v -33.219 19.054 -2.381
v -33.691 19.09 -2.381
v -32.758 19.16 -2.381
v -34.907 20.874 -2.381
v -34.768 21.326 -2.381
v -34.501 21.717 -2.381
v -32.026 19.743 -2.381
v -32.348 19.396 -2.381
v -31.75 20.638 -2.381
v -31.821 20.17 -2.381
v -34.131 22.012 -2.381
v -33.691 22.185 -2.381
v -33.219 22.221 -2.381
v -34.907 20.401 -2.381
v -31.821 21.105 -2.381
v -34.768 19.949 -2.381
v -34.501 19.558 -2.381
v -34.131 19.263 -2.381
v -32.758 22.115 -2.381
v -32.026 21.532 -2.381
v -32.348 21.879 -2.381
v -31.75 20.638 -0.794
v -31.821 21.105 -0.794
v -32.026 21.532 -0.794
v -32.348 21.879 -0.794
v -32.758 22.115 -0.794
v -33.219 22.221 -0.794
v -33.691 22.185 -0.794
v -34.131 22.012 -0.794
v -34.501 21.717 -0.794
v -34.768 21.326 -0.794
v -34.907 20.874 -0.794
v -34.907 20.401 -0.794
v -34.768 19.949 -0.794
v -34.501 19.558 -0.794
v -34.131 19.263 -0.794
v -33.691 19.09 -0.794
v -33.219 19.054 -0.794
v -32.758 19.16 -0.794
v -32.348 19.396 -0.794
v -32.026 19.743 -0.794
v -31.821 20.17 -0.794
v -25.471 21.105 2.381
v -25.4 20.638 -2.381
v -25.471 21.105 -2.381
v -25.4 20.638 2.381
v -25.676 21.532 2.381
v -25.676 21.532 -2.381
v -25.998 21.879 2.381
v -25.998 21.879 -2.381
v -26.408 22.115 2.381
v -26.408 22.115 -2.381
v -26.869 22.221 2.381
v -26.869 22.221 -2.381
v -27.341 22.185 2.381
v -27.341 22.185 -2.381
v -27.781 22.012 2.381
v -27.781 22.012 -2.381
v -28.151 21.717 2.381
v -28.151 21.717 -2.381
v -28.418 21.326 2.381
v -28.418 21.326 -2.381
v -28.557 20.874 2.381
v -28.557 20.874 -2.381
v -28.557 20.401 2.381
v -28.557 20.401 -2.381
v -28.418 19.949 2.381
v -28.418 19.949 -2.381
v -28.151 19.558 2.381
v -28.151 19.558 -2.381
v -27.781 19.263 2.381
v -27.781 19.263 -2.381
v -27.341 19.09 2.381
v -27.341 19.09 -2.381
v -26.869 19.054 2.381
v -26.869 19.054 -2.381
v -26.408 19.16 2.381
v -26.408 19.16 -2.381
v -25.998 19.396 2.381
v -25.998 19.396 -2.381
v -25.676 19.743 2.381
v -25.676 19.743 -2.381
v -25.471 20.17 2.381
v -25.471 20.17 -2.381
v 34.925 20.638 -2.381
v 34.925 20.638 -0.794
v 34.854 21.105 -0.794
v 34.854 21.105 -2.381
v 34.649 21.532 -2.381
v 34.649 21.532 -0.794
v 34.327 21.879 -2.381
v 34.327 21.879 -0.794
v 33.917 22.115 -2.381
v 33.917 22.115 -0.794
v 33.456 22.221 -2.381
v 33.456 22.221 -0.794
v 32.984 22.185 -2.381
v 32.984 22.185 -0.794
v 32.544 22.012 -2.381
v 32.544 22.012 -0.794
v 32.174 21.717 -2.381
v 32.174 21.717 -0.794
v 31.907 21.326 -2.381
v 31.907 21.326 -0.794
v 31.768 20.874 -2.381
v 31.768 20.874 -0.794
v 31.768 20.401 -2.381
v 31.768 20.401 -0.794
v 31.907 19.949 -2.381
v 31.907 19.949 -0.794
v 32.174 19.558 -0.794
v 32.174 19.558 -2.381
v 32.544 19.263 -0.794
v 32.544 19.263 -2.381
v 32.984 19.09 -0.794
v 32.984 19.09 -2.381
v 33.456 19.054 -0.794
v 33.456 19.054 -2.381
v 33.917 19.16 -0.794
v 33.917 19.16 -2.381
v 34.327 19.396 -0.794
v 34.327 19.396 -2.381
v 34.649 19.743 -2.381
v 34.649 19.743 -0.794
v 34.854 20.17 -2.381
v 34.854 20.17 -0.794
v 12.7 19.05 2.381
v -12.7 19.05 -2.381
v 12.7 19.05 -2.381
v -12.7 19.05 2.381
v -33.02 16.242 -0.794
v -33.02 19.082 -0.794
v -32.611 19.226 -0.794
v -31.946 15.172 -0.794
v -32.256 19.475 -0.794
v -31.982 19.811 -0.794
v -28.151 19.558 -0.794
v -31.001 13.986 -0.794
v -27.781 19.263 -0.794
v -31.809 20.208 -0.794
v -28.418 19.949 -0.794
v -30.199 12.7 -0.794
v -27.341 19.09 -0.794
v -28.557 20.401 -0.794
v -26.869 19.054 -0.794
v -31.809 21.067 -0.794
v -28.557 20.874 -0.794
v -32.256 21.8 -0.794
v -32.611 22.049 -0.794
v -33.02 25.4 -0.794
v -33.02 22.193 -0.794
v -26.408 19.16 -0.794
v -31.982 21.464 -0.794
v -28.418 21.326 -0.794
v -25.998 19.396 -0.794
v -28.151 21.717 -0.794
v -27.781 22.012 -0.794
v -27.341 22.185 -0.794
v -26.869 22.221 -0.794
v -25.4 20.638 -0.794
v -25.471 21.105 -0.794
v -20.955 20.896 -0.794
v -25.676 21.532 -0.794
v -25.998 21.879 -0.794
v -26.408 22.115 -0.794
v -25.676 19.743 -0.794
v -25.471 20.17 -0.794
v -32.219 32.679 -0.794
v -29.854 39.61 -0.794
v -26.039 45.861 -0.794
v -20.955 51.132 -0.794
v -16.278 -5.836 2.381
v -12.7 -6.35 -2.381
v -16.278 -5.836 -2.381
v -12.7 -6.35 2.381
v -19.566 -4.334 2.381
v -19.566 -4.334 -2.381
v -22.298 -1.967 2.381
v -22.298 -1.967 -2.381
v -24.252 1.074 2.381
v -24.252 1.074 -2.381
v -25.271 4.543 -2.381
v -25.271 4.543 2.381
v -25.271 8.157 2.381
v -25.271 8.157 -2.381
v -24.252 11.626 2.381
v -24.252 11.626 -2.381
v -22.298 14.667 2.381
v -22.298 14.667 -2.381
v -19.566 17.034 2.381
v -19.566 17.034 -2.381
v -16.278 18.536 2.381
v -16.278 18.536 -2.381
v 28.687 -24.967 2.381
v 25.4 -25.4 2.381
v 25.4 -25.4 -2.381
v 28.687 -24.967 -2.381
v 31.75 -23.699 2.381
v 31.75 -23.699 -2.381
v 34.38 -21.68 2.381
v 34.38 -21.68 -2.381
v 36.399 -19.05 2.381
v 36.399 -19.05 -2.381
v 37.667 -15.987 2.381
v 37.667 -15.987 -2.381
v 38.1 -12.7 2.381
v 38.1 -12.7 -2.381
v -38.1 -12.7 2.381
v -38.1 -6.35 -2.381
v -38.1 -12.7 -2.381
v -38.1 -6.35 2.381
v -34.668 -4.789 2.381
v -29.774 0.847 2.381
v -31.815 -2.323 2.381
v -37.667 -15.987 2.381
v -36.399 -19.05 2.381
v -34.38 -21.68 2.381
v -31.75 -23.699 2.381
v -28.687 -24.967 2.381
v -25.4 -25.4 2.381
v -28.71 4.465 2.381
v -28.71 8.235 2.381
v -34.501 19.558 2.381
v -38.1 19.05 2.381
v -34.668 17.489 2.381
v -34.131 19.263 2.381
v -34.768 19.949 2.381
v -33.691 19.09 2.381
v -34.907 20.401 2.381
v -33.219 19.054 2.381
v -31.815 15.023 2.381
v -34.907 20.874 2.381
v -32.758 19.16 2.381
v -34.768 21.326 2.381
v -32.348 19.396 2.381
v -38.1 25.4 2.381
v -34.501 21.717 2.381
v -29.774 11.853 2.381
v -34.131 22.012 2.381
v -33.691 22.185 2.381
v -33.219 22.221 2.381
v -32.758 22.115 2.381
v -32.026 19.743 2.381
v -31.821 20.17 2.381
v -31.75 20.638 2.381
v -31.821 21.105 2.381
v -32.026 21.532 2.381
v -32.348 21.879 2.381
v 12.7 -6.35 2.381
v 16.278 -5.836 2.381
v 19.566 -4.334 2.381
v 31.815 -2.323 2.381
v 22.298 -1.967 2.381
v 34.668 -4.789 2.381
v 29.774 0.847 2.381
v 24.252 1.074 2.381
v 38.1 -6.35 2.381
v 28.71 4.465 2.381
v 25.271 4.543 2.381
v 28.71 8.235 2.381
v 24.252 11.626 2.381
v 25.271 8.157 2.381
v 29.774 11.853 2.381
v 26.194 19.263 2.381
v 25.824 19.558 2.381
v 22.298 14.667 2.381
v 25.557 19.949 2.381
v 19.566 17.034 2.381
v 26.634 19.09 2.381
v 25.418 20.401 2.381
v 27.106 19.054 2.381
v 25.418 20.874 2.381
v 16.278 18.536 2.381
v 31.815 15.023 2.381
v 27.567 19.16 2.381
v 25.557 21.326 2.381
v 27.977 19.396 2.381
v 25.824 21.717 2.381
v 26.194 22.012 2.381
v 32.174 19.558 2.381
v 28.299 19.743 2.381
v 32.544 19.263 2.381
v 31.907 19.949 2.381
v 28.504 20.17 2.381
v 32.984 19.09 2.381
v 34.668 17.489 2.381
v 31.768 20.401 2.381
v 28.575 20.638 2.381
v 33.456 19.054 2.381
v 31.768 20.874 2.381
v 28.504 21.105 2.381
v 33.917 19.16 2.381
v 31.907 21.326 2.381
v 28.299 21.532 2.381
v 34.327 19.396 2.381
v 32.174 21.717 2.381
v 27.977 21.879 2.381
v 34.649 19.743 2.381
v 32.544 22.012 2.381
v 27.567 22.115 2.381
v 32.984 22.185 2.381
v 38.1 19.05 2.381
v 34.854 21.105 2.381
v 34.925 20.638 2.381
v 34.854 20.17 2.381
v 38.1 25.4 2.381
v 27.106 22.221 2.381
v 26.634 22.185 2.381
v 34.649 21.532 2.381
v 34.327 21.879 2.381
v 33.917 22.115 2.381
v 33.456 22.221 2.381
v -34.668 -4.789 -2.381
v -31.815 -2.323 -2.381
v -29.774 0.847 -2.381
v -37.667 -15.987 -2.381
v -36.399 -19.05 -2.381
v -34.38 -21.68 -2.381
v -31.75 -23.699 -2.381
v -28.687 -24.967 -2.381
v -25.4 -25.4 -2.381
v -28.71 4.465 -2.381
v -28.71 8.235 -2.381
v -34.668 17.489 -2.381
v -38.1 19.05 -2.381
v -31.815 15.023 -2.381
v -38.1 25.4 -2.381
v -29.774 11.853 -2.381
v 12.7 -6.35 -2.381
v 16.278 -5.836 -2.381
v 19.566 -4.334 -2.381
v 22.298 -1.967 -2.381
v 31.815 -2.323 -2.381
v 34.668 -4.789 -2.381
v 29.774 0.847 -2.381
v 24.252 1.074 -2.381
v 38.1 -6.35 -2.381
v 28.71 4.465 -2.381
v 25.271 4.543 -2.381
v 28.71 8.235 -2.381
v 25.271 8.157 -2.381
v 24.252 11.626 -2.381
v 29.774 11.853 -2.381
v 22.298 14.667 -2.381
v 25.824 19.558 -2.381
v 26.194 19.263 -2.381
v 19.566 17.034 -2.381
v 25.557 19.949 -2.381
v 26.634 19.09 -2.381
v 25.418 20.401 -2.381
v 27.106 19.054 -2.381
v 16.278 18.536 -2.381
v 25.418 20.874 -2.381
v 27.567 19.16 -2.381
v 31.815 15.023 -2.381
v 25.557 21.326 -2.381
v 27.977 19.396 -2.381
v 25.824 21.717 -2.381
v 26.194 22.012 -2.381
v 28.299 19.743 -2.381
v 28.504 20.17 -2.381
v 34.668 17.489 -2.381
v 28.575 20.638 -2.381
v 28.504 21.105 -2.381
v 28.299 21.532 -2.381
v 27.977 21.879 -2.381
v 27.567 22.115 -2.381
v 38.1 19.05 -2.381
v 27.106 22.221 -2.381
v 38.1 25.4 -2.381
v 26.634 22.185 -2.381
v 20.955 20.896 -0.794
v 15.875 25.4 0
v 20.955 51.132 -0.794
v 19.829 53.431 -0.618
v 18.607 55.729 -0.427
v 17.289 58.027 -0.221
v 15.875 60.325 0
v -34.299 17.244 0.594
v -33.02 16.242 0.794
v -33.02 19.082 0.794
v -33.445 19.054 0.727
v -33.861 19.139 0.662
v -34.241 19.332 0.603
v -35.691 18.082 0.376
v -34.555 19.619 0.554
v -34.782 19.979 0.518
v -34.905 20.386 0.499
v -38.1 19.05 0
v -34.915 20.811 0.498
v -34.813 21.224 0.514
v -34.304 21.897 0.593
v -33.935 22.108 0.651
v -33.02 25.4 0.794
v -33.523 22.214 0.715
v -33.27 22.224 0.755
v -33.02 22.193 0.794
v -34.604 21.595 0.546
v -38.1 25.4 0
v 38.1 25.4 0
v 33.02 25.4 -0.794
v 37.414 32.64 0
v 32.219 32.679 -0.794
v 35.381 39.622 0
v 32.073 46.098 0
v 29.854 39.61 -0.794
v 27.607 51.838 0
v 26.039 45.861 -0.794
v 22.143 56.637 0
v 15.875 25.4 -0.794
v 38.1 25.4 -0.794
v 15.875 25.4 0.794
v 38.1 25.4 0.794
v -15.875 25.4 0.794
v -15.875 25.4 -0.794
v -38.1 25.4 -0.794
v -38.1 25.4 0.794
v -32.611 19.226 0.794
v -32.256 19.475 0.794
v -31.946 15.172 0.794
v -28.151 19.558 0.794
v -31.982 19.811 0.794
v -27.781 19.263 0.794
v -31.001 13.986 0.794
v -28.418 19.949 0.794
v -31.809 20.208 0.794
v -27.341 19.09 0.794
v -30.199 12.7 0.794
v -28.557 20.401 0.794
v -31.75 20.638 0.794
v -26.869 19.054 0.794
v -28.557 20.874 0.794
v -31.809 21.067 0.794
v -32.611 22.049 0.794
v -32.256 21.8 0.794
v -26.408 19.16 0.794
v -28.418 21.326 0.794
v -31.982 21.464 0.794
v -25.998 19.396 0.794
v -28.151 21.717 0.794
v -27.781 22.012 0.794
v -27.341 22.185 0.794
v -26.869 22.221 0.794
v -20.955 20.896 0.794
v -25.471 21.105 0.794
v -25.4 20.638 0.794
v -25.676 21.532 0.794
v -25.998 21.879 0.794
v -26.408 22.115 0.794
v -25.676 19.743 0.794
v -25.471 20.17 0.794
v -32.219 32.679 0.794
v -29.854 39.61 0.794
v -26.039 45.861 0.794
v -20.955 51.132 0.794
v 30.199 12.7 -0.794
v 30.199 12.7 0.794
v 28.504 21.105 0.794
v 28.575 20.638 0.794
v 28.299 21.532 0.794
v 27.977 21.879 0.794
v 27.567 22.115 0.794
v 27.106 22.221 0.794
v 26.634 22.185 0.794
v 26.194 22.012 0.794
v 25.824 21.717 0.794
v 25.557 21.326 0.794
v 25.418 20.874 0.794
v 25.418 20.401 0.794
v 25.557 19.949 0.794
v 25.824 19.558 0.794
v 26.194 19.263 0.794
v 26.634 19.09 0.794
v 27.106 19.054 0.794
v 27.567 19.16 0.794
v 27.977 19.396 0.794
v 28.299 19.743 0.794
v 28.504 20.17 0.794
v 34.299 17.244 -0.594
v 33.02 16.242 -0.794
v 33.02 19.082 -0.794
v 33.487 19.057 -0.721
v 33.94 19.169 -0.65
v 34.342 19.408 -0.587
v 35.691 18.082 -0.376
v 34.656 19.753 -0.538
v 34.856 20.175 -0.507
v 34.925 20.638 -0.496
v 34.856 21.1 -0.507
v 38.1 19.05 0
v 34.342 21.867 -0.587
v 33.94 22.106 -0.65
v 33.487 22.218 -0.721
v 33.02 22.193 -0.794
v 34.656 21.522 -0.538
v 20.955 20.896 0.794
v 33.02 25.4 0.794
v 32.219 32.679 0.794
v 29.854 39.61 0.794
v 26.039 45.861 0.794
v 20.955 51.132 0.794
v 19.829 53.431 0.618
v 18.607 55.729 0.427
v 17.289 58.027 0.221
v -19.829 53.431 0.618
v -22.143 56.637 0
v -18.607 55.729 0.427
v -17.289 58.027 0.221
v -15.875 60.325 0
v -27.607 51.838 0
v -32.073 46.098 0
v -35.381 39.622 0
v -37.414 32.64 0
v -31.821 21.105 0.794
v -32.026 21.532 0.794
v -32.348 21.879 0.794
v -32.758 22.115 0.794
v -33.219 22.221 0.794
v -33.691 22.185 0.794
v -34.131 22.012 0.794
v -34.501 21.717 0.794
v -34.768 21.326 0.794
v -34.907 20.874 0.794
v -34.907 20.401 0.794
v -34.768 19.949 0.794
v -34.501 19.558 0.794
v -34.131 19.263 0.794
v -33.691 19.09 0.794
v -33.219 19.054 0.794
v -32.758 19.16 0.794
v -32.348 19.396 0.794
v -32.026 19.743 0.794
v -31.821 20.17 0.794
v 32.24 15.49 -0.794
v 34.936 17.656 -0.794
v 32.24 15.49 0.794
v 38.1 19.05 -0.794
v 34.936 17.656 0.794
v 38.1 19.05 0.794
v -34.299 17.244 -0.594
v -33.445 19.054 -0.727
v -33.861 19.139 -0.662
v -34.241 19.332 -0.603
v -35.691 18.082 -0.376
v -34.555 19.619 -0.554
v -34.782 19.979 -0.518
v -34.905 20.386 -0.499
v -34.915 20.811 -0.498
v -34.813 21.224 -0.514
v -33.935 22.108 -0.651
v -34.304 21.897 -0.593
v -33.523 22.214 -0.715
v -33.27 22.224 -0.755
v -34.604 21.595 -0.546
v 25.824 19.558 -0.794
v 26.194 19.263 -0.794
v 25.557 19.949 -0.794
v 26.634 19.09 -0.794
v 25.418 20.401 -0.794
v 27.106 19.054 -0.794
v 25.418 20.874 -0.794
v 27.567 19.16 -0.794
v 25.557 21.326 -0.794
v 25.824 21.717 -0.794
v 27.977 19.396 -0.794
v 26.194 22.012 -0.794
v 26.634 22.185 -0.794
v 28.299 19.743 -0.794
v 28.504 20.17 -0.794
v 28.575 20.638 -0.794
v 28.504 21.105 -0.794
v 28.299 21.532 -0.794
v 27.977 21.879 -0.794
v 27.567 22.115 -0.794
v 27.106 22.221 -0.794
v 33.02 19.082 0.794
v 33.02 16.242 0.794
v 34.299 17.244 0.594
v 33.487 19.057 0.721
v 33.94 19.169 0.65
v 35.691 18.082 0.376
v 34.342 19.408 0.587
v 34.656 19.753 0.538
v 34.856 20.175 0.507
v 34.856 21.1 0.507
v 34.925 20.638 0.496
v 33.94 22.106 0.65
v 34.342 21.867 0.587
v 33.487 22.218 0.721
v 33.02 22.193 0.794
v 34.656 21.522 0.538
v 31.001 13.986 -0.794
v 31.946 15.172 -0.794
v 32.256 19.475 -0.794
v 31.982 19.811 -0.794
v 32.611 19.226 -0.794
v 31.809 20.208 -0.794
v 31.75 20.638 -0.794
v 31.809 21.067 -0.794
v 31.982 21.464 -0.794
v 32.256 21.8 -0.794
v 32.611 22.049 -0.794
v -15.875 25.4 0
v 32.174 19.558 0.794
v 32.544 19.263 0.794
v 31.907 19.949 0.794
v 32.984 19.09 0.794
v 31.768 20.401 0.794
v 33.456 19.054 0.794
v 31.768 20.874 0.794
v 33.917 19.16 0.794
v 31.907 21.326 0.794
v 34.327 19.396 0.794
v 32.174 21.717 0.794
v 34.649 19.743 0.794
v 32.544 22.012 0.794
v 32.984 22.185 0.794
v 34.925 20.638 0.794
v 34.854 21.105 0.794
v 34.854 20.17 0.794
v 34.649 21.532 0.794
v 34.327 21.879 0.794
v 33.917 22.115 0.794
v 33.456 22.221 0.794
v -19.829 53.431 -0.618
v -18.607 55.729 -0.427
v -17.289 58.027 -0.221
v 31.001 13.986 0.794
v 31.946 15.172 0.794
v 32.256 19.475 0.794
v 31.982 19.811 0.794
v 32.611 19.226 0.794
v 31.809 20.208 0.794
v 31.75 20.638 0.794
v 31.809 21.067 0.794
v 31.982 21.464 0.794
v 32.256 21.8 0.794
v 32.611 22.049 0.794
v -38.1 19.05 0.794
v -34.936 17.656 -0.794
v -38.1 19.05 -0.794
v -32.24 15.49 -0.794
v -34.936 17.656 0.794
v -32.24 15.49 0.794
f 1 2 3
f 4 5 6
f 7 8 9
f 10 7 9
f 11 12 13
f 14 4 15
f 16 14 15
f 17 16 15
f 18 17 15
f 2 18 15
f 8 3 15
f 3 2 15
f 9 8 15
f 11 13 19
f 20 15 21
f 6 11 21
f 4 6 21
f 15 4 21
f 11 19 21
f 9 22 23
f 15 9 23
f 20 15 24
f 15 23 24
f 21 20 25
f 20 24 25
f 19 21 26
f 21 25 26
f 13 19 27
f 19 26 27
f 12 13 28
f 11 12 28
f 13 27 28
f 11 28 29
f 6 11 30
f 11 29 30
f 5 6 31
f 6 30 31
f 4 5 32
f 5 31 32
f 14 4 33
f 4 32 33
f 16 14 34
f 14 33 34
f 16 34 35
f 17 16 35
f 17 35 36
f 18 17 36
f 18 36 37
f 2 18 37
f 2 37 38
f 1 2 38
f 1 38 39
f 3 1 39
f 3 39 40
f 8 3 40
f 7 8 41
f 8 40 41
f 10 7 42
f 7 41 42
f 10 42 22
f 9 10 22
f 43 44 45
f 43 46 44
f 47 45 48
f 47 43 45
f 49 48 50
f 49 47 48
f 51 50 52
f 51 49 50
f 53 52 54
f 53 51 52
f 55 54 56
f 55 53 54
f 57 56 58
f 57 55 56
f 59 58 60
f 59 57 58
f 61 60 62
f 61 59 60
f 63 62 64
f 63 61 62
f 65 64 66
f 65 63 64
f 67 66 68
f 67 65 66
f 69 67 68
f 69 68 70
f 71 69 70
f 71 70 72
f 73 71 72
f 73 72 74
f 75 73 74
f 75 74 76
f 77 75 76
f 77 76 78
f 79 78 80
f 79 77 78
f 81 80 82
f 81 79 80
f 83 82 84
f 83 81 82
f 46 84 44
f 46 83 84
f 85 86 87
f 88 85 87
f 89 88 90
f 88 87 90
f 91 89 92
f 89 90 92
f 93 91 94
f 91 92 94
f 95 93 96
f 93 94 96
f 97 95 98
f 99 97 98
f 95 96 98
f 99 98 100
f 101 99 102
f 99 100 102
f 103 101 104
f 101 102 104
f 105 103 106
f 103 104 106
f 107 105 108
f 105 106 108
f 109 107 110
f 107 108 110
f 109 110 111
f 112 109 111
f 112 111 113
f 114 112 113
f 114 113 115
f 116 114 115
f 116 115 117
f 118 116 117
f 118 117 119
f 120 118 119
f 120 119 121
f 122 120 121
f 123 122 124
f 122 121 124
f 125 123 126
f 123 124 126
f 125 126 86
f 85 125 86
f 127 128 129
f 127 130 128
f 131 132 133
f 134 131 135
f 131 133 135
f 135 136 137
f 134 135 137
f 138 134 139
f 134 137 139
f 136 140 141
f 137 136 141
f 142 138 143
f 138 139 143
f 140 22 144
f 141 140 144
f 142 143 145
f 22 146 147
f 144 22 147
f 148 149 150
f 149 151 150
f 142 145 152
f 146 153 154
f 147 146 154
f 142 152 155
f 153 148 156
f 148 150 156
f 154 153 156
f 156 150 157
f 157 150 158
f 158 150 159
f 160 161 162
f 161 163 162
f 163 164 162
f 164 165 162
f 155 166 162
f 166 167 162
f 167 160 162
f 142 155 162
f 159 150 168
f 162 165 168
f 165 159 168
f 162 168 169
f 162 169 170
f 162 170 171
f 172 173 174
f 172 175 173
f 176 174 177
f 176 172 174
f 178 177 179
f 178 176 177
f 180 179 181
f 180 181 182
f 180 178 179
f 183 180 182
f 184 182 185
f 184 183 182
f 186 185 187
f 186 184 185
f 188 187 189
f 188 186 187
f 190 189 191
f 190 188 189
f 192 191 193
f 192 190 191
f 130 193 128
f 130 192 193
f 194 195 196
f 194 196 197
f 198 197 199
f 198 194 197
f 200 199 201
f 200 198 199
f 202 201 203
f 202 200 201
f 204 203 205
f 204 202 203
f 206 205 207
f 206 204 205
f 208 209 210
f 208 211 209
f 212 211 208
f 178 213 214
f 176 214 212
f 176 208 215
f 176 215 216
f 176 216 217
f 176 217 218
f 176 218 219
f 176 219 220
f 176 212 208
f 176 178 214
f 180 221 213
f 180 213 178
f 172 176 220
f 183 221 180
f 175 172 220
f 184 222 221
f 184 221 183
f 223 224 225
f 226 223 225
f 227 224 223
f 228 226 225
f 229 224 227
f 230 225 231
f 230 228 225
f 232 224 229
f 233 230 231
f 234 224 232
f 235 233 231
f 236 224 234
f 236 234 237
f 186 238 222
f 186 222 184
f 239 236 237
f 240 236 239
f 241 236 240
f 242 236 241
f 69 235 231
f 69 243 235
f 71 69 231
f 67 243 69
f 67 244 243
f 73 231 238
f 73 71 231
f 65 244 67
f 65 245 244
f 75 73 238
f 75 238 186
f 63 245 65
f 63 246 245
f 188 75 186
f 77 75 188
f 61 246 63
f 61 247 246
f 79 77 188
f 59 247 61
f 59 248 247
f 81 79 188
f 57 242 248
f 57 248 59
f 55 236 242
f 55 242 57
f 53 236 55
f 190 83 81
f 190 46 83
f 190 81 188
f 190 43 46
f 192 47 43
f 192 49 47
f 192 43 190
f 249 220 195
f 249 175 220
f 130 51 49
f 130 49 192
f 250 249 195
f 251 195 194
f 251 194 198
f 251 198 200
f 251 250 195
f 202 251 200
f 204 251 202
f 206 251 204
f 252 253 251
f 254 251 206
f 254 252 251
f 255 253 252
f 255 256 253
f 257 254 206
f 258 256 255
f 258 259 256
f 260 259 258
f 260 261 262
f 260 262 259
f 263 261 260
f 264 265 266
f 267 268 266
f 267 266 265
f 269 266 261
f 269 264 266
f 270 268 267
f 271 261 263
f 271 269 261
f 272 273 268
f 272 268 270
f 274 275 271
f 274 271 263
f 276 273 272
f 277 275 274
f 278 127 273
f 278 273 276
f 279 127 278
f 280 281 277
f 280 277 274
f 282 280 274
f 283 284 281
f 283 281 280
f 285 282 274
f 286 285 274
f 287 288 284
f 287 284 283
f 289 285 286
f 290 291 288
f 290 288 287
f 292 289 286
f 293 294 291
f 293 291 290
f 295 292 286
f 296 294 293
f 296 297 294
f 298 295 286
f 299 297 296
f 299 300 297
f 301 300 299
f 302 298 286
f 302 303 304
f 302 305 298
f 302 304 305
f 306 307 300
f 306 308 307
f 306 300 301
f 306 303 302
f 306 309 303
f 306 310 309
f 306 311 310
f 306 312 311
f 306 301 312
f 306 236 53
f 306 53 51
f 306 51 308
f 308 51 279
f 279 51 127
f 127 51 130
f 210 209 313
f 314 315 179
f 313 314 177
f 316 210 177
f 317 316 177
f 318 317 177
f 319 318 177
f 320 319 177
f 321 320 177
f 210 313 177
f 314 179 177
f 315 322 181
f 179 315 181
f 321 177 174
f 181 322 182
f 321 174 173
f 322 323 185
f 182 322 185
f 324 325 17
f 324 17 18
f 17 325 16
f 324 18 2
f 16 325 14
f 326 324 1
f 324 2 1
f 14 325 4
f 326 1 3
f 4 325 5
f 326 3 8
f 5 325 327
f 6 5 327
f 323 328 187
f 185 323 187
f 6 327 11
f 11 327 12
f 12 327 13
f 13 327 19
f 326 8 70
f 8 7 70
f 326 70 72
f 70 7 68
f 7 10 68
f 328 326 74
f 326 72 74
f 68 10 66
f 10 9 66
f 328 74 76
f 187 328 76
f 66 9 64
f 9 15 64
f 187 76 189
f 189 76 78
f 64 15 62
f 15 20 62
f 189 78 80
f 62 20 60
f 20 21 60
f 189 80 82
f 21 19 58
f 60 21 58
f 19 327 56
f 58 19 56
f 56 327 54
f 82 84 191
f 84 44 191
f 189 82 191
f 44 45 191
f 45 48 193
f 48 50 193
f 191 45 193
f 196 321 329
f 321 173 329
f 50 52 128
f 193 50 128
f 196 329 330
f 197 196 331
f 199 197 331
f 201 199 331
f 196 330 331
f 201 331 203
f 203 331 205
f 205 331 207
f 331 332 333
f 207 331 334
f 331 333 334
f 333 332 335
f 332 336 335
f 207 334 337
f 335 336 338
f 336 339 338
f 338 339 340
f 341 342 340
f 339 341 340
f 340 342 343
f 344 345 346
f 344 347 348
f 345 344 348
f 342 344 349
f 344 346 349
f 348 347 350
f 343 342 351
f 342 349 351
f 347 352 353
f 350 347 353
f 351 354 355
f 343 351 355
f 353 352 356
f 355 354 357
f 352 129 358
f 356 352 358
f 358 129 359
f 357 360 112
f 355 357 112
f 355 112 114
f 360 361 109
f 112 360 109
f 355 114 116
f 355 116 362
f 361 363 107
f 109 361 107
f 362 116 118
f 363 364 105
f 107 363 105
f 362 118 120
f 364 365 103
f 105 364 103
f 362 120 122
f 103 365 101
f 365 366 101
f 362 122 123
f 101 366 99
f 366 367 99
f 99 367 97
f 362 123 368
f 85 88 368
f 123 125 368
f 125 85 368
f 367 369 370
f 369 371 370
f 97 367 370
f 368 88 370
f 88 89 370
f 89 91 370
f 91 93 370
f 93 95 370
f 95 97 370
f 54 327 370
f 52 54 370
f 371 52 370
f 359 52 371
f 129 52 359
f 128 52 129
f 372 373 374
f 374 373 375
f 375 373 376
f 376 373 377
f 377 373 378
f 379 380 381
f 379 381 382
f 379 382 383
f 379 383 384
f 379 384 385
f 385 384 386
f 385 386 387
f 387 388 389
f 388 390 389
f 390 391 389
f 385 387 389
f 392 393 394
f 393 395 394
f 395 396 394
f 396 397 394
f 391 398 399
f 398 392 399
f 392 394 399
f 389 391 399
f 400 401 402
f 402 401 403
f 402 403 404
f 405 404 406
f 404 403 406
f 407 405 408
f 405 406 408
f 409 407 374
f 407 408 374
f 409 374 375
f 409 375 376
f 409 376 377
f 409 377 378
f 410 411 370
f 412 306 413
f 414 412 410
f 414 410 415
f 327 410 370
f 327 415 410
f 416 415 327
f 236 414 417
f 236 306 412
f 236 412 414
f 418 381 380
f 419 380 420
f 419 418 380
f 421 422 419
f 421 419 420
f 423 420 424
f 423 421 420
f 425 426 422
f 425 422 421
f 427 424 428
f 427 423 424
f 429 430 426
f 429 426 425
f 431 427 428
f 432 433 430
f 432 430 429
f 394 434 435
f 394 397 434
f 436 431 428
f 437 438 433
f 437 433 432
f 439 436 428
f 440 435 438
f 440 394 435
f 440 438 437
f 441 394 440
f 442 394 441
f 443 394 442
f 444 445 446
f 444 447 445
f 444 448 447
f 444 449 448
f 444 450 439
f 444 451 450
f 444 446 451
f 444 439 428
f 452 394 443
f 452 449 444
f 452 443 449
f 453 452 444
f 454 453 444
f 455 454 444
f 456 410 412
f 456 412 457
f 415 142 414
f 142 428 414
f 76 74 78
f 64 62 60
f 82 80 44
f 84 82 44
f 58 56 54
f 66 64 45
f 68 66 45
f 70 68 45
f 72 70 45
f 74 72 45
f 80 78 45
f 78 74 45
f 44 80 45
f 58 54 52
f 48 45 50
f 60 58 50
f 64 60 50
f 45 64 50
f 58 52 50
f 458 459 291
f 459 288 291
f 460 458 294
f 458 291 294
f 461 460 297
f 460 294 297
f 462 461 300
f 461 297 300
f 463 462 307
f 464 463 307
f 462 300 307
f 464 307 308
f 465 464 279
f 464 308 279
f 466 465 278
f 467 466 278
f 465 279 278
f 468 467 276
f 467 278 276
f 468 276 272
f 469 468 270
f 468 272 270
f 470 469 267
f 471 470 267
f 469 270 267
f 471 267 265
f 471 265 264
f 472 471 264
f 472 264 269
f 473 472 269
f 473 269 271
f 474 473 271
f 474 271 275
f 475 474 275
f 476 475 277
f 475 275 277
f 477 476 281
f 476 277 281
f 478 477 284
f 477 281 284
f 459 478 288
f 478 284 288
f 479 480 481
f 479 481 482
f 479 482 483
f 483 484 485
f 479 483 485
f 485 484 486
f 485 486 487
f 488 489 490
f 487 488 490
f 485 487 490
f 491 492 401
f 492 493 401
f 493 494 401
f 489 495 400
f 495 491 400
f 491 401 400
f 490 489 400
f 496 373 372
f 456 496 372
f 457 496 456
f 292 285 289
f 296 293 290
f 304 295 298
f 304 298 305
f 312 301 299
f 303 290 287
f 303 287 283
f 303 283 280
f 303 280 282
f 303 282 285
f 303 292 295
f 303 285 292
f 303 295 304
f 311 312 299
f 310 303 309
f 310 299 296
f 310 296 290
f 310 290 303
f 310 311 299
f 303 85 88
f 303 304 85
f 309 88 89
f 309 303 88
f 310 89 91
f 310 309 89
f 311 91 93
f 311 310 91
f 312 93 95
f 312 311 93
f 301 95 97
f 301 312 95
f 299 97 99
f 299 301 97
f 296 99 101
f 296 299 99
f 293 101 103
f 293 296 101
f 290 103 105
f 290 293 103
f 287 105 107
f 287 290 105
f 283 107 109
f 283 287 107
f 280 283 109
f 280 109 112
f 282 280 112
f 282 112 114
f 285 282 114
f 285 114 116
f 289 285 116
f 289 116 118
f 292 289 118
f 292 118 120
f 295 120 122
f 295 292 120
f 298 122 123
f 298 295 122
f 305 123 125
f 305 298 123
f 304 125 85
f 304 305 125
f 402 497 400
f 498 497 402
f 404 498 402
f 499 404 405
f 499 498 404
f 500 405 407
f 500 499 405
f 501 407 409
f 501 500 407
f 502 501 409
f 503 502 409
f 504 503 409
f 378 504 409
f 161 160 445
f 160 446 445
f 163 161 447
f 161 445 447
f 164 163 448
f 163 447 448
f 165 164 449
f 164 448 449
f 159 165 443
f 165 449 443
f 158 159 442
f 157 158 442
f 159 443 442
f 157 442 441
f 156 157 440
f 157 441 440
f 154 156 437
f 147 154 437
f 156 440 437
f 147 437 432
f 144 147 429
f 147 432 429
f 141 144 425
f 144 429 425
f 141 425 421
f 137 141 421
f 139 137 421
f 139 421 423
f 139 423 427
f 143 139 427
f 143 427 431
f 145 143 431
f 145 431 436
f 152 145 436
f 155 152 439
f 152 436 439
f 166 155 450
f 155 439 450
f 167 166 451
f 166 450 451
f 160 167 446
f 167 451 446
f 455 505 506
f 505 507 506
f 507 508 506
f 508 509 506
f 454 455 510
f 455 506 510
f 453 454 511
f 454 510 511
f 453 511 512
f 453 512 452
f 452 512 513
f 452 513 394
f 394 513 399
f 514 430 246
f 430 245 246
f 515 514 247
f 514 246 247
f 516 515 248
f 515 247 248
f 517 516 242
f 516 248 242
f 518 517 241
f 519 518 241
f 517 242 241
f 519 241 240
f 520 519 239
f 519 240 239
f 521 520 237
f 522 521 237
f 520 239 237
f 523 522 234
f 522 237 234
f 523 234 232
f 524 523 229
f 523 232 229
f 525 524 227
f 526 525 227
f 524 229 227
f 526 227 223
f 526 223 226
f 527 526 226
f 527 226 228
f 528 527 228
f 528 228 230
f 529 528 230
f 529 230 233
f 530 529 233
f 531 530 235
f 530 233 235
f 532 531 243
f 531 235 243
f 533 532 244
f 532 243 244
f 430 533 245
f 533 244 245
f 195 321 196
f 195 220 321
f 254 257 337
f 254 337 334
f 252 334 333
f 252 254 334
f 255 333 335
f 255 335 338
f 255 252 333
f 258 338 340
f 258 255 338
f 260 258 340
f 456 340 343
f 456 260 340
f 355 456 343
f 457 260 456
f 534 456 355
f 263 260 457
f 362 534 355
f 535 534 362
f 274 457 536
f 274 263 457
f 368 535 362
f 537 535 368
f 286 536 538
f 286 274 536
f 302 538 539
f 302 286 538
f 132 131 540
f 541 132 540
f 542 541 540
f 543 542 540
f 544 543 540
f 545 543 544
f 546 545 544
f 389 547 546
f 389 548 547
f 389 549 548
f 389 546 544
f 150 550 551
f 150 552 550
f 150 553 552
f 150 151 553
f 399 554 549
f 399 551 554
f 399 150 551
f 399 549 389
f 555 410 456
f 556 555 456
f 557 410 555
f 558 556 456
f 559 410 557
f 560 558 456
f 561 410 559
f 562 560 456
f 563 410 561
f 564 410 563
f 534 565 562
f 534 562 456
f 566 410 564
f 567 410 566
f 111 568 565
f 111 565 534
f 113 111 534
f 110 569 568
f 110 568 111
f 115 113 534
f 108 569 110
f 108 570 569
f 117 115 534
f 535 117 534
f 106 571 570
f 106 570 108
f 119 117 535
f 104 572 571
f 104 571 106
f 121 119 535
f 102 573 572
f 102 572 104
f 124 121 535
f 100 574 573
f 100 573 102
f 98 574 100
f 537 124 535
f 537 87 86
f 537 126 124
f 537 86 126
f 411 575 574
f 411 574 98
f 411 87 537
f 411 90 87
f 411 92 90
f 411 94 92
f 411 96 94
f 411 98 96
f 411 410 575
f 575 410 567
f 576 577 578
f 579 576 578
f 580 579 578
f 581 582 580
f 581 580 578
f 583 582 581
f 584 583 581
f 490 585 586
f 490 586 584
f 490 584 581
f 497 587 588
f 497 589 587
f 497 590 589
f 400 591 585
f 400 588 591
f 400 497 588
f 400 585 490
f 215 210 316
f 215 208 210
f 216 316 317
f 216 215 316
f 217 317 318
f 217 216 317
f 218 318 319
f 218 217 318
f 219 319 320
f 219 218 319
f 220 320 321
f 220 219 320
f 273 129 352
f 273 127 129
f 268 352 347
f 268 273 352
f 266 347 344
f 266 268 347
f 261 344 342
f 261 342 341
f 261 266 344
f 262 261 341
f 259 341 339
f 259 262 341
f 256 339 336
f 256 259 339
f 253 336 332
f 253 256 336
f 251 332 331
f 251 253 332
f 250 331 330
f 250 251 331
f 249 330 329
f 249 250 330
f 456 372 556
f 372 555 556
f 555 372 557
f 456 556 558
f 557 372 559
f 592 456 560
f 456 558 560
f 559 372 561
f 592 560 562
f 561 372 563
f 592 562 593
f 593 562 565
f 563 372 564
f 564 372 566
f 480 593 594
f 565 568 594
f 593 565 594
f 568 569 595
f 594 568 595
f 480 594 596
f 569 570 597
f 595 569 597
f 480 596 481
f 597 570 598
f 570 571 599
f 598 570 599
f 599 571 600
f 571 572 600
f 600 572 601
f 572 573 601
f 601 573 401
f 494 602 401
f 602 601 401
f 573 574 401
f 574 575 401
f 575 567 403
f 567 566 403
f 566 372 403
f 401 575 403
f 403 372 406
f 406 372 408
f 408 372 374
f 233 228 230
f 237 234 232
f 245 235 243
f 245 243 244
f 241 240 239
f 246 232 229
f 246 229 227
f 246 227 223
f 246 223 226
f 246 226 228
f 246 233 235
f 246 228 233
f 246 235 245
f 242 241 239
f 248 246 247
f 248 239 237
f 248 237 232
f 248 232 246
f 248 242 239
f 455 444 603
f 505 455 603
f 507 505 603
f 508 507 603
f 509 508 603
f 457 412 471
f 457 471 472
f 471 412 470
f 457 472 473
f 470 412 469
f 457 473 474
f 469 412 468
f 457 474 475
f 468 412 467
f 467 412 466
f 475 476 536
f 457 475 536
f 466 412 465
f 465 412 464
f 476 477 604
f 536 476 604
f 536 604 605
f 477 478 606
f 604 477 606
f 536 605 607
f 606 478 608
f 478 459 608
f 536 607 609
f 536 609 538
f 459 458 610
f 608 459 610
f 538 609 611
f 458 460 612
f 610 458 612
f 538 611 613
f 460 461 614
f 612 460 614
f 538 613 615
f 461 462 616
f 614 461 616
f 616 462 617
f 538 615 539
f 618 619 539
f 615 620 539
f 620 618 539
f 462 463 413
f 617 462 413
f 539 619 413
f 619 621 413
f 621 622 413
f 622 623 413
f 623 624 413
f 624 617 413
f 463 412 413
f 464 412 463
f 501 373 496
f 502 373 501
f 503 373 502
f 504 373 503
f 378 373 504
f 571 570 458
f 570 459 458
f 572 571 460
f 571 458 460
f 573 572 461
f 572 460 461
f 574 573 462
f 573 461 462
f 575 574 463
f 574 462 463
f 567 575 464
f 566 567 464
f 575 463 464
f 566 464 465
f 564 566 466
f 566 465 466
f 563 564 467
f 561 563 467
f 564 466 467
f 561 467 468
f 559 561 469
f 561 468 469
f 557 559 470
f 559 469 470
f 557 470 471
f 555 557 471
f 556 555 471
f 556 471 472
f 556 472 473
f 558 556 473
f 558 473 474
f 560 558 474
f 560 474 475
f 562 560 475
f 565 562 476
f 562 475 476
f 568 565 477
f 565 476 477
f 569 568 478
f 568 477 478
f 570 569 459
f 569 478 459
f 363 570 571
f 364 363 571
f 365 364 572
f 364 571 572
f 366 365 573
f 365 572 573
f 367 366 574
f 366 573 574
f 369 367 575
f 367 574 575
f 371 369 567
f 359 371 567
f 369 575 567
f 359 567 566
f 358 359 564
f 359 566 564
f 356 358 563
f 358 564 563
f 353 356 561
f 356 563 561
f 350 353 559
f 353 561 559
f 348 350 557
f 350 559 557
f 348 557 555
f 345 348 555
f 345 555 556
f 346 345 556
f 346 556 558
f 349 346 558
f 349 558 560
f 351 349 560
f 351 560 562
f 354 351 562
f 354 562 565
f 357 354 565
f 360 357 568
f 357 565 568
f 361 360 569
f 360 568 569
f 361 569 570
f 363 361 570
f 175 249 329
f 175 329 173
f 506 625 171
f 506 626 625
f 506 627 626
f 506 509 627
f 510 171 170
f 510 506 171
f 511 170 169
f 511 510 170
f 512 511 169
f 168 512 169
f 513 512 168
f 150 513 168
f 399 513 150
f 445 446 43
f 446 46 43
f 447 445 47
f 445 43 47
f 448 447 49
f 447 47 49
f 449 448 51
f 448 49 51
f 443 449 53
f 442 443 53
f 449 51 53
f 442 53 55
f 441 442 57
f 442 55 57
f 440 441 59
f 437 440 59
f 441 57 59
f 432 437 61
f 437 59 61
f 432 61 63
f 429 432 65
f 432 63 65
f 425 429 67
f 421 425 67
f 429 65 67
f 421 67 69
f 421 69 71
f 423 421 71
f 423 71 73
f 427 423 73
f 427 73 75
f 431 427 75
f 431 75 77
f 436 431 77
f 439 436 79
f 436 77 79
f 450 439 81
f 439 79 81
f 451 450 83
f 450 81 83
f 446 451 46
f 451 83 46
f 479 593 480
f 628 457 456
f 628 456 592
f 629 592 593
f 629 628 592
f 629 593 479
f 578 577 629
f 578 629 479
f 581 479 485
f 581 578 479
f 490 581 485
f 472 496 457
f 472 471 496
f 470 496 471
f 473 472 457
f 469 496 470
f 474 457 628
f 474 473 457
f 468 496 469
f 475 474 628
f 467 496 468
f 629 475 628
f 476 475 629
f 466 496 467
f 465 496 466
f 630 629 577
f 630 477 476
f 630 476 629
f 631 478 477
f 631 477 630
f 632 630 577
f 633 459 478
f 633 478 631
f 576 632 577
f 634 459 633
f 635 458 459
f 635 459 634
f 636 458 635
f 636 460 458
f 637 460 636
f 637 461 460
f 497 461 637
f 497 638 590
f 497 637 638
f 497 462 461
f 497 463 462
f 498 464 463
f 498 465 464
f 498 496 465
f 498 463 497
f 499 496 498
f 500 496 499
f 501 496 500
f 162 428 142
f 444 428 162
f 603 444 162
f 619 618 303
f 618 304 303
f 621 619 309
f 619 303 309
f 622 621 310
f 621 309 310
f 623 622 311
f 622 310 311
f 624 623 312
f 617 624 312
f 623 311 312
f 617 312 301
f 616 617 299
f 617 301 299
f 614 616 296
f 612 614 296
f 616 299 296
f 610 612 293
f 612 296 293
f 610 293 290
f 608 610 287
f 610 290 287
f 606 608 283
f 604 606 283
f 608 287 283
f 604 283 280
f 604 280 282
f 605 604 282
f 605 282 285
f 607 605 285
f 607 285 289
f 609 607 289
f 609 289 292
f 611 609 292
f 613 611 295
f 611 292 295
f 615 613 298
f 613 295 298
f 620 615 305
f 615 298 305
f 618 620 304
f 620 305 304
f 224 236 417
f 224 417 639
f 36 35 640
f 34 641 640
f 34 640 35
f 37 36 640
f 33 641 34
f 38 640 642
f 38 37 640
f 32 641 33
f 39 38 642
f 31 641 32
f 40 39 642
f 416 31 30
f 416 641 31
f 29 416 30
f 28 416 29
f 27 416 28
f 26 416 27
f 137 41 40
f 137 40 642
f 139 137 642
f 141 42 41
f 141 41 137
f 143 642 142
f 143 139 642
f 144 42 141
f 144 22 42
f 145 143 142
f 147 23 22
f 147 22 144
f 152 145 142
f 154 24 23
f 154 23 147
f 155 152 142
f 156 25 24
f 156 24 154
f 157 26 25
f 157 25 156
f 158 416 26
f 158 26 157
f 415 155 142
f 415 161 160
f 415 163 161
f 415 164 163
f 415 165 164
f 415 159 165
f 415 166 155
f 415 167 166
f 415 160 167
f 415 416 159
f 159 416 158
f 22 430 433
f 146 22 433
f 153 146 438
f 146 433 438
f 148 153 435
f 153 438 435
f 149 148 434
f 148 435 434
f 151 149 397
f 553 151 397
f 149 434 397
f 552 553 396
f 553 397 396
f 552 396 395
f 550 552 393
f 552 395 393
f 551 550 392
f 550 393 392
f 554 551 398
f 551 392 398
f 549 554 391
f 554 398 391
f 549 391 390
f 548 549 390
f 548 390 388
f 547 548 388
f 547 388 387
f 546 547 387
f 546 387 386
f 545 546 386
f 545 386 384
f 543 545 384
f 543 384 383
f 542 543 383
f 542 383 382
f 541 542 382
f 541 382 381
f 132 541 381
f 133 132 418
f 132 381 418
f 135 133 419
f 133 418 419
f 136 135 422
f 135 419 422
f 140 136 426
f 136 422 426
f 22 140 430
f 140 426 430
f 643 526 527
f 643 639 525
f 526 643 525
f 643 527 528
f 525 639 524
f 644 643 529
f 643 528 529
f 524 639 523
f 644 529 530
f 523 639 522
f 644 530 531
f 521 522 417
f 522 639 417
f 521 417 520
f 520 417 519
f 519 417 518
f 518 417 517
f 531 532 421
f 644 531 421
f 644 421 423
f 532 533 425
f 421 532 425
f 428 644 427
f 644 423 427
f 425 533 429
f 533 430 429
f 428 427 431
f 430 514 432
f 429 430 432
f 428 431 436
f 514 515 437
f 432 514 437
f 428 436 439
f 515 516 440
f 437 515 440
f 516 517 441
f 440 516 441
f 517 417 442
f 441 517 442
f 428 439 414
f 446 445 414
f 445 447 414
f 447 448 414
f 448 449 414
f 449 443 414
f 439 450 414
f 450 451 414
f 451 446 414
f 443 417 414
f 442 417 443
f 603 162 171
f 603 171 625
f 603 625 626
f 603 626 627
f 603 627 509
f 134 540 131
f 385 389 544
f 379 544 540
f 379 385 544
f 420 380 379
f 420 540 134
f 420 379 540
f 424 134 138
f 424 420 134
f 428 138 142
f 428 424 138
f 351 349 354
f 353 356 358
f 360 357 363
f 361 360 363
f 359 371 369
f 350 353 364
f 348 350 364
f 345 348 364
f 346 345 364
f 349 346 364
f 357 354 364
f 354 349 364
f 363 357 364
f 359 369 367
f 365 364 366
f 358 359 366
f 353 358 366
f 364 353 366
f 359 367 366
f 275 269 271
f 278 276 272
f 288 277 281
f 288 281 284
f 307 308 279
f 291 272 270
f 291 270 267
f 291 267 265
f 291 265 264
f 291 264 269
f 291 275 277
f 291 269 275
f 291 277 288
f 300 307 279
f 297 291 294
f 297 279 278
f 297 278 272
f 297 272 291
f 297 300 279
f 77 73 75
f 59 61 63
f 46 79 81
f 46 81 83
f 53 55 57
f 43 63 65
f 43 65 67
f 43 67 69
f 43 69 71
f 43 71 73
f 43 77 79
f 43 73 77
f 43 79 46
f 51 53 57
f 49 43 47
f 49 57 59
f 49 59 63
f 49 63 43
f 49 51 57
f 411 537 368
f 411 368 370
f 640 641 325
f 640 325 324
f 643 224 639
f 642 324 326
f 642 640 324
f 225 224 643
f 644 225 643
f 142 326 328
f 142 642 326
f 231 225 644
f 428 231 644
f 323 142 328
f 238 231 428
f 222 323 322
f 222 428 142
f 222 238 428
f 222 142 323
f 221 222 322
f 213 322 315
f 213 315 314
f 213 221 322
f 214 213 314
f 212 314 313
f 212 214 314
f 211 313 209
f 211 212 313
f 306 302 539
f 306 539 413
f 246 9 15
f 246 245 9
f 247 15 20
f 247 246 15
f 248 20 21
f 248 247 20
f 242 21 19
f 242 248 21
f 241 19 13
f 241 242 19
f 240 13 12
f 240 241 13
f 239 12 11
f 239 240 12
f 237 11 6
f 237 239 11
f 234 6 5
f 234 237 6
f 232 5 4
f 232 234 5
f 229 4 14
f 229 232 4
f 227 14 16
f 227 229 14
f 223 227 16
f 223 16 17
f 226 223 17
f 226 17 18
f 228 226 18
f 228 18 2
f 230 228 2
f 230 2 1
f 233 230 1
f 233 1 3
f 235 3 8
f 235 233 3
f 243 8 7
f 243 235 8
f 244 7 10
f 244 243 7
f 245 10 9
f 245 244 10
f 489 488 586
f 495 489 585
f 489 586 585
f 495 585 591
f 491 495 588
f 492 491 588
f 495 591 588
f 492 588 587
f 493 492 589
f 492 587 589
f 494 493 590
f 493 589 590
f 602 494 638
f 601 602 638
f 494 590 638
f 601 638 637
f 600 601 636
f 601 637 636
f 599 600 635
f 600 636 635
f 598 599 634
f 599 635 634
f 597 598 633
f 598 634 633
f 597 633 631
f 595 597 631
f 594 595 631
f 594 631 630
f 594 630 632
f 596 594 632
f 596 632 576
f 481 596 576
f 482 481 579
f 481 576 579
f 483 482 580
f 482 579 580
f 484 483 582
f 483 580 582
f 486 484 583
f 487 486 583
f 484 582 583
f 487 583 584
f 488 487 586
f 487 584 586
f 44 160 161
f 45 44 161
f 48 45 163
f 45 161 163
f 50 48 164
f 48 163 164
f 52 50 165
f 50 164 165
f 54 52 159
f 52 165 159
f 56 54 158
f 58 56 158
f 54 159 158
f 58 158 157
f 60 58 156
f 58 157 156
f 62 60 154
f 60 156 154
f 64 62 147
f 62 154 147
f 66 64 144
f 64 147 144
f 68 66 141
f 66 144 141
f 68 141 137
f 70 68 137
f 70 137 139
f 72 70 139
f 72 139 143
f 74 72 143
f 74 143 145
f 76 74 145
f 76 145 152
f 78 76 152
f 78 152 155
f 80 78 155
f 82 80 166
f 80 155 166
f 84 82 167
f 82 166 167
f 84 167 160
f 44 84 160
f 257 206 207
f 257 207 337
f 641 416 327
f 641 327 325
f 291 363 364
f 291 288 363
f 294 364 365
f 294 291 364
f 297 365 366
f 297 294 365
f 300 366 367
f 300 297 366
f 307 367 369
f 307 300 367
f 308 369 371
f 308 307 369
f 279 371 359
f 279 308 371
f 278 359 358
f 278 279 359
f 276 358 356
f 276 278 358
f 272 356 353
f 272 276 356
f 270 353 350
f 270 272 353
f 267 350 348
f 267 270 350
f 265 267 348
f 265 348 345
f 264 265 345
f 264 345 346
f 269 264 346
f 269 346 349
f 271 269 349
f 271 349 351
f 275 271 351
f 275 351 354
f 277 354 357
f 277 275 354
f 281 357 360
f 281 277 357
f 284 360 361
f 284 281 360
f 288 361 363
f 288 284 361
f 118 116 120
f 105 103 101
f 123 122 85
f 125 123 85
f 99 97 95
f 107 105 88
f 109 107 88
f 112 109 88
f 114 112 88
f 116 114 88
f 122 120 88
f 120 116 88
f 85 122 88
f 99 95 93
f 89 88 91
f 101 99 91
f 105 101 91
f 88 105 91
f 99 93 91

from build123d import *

# Parameters (mm, degrees)
F1_DEPTH      = 2.38125
F1_DEPTH_BACK = 2.38125
F3_DEPTH      = 0.79375
F3_DEPTH_BACK = 0.79375
F4_DEPTH      = 0.79375
F4_DEPTH_BACK = 0.79375
F5_R          = 1.5875
F6_DEPTH      = 2.38125
F6_DEPTH_BACK = 2.38125
F7_DEPTH      = 2.38125
F7_DEPTH_BACK = 2.38125
F8_T1_DEPTH   = 61.3292860819
F8_T3_DEPTH   = 19.552143041
F8_T6_ANGLE   = 84.5666435794
F8_2_T1_DEPTH = 61.3292860819
F8_2_T3_DEPTH = 19.552143041
F8_2_T6_ANGLE = 84.5666435794
F9_T1_DEPTH   = 61.3292860819
F9_T3_DEPTH   = 19.552143041
F9_T6_ANGLE   = 84.5666435794
F9_2_T1_DEPTH = 61.3292860819
F9_2_T3_DEPTH = 19.552143041
F9_2_T6_ANGLE = 84.5666435794


# Not quite as in the source:
# - a fillet or chamfer that OpenCascade refuses, or shapes differently, is made with other operations: its cross-section is extruded or revolved along the edge and cut away or added


with BuildPart() as f1:
    # F0 (on Top) → F1 (new body, two sides)
    with BuildSketch(Plane.XY) as f1_sk:
        with BuildLine():
            Line((-25.4, -25.4), (25.4, -25.4))
            ThreePointArc((25.4, -25.4), (34.3802561211, -21.6802561211), (38.1, -12.7))
            Line((38.1, -12.7), (38.1, -6.35))
            ThreePointArc((38.1, -6.35), (28.575, 6.35), (38.1, 19.05))
            Line((38.1, 19.05), (38.1, 25.4))
            Line((38.1, 25.4), (-38.1, 25.4))
            Line((-38.1, 25.4), (-38.1, 19.05))
            ThreePointArc((-38.1, 19.05), (-28.575, 6.35), (-38.1, -6.35))
            Line((-38.1, -6.35), (-38.1, -12.7))
            ThreePointArc((-38.1, -12.7), (-34.3802561211, -21.6802561211), (-25.4, -25.4))
        make_face()
        with BuildLine():
            Line((12.7, -6.35), (-12.7, -6.35))
            ThreePointArc((-12.7, -6.35), (-25.4, 6.35), (-12.7, 19.05))
            Line((-12.7, 19.05), (12.7, 19.05))
            ThreePointArc((12.7, 19.05), (25.4, 6.35), (12.7, -6.35))
        make_face(mode=Mode.SUBTRACT)
    extrude(amount=F1_DEPTH)
    extrude(f1_sk.sketch, amount=-F1_DEPTH_BACK)

    # F2 (on Top) → F3 (cut, two sides)
    with BuildSketch(Plane.XY) as f3_sk:
        with BuildLine():
            ThreePointArc((-15.875, 60.325), (-32.0725920002, 46.0984676365), (-38.1, 25.4))
            Line((-38.1, 25.4), (-38.1, 19.05))
            ThreePointArc((-38.1, 19.05), (-33.5169876558, 16.661814328), (-30.1986356278, 12.7))
            Line((-30.1986356278, 12.7), (-15.875, 25.4))
            Line((-15.875, 25.4), (-15.875, 60.325))
        make_face()
        with BuildLine():
            Line((15.875, 60.325), (15.875, 25.4))
            Line((15.875, 25.4), (30.1986356278, 12.7))
            ThreePointArc((30.1986356278, 12.7), (33.5169876558, 16.661814328), (38.1, 19.05))
            Line((38.1, 19.05), (38.1, 25.4))
            ThreePointArc((38.1, 25.4), (32.0725920002, 46.0984676365), (15.875, 60.325))
        make_face()
    extrude(amount=F3_DEPTH, mode=Mode.SUBTRACT)
    extrude(f3_sk.sketch, amount=-F3_DEPTH_BACK, mode=Mode.SUBTRACT)


with BuildPart() as f4:
    # F2 (on Top) → F4 (new body, two sides)
    with BuildSketch(Plane.XY) as f4_sk:
        with BuildLine():
            Line((15.875, 60.325), (15.875, 25.4))
            Line((15.875, 25.4), (30.1986356278, 12.7))
            ThreePointArc((30.1986356278, 12.7), (33.5169876558, 16.661814328), (38.1, 19.05))
            Line((38.1, 19.05), (38.1, 25.4))
            ThreePointArc((38.1, 25.4), (32.0725920002, 46.0984676365), (15.875, 60.325))
        make_face()
    extrude(amount=F4_DEPTH)
    extrude(f4_sk.sketch, amount=-F4_DEPTH_BACK)


with BuildPart() as f4b:
    # F2 (on Top) → F4, piece 2 (new body, two sides)
    with BuildSketch(Plane.XY) as f4_2_sk:
        with BuildLine():
            ThreePointArc((-15.875, 60.325), (-32.0725920002, 46.0984676365), (-38.1, 25.4))
            Line((-38.1, 25.4), (-38.1, 19.05))
            ThreePointArc((-38.1, 19.05), (-33.5169876558, 16.661814328), (-30.1986356278, 12.7))
            Line((-30.1986356278, 12.7), (-15.875, 25.4))
            Line((-15.875, 25.4), (-15.875, 60.325))
        make_face()
    extrude(amount=F4_DEPTH)
    extrude(f4_2_sk.sketch, amount=-F4_DEPTH_BACK)


with BuildPart() as f6_tool:
    # F5 (on Top) → F6 (new body, two sides)
    with BuildSketch(Plane.XY) as f6_sk:
        with Locations((-26.9875, 20.6375)):
            Circle(F5_R)
        with Locations((26.9875, 20.6375)):
            Circle(F5_R)
        with Locations((-33.3375, 20.6375)):
            Circle(F5_R)
        with Locations((33.3375, 20.6375)):
            Circle(F5_R)
    extrude(amount=F6_DEPTH)
    extrude(f6_sk.sketch, amount=-F6_DEPTH_BACK)


with BuildPart() as f1_1:
    add(f1.part)

    # F6: cut by f6_tool
    add(f6_tool.part, mode=Mode.SUBTRACT)


with BuildPart() as f4_1:
    add(f4.part)

    # F6: cut by f6_tool
    add(f6_tool.part, mode=Mode.SUBTRACT)

    # F8: chamfer of 0.79375 x 5.08 on 2 edges, made by hand

    # F8_s2 → F8_t1 (cut)
    with BuildSketch(Plane.XZ.offset(-73.527143041)):
        Polygon((15.875, 0), (20.955, 0.79375), (15.875, 0.79375), align=None)
    extrude(amount=F8_T1_DEPTH, mode=Mode.SUBTRACT)

    # F8_s4 → F8_t3 (cut)
    with BuildSketch(Plane.XZ.offset(-25.4)):
        Polygon((33.02, 0.79375), (38.1, 0), (38.1, 0.79375), align=None)
    extrude(amount=F8_T3_DEPTH, mode=Mode.SUBTRACT)

    # F8_s5 → F8_t6 (revolve, cut)
    with BuildSketch(Plane.XZ.offset(-25.4)):
        Polygon((38.1, 0), (33.02, 0.79375), (38.1, 0.79375), align=None)
    revolve(axis=Axis((-0.4535714286, 25.4, 0.79375), (0, 0, 1)), revolution_arc=F8_T6_ANGLE, mode=Mode.SUBTRACT)

    # F9: chamfer of 0.79375 x 5.08 on 2 edges, made by hand

    # F9_s2 → F9_t1 (cut)
    with BuildSketch(Plane.XZ.offset(-73.527143041)):
        Polygon((15.875, 0), (20.955, -0.79375), (15.875, -0.79375), align=None)
    extrude(amount=F9_T1_DEPTH, mode=Mode.SUBTRACT)

    # F9_s4 → F9_t3 (cut)
    with BuildSketch(Plane.XZ.offset(-25.4)):
        Polygon((33.02, -0.79375), (38.1, 0), (38.1, -0.79375), align=None)
    extrude(amount=F9_T3_DEPTH, mode=Mode.SUBTRACT)

    # F9_s5 → F9_t6 (revolve, cut)
    with BuildSketch(Plane.XZ.offset(-25.4)):
        Polygon((38.1, 0), (33.02, -0.79375), (38.1, -0.79375), align=None)
    revolve(axis=Axis((-0.4535714286, 25.4, -0.79375), (0, 0, 1)), revolution_arc=F9_T6_ANGLE, mode=Mode.SUBTRACT)


with BuildPart() as f4b_1:
    add(f4b.part)

    # F6: cut by f6_tool
    add(f6_tool.part, mode=Mode.SUBTRACT)

    # F8#2: chamfer of 0.79375 x 5.08 on 2 edges, made by hand

    # F8_2_s2 → F8_2_t1 (cut)
    with BuildSketch(Plane.XZ.offset(-73.527143041)):
        Polygon((-20.955, 0.79375), (-15.875, 0), (-15.875, 0.79375), align=None)
    extrude(amount=F8_2_T1_DEPTH, mode=Mode.SUBTRACT)

    # F8_2_s4 → F8_2_t3 (cut)
    with BuildSketch(Plane.XZ.offset(-25.4)):
        Polygon((-33.02, 0.79375), (-38.1, 0), (-38.1, 0.79375), align=None)
    extrude(amount=F8_2_T3_DEPTH, mode=Mode.SUBTRACT)

    # F8_2_s5 → F8_2_t6 (revolve, cut)
    with BuildSketch(Plane(origin=(2.8437713092, 0.2704860048, 0), x_dir=(0, 0, 1), z_dir=(0.995507008, 0.094687893, 0))):
        Polygon((0.79375, -58.7165017082), (0, -63.7965017082), (0.79375, -63.7965017082), align=None)
    revolve(axis=Axis((0.4535714286, 25.4, 0.79375), (0, 0, 1)), revolution_arc=F8_2_T6_ANGLE, mode=Mode.SUBTRACT)

    # F9#2: chamfer of 0.79375 x 5.08 on 2 edges, made by hand

    # F9_2_s2 → F9_2_t1 (cut)
    with BuildSketch(Plane.XZ.offset(-73.527143041)):
        Polygon((-20.955, -0.79375), (-15.875, 0), (-15.875, -0.79375), align=None)
    extrude(amount=F9_2_T1_DEPTH, mode=Mode.SUBTRACT)

    # F9_2_s4 → F9_2_t3 (cut)
    with BuildSketch(Plane.XZ.offset(-25.4)):
        Polygon((-33.02, -0.79375), (-38.1, 0), (-38.1, -0.79375), align=None)
    extrude(amount=F9_2_T3_DEPTH, mode=Mode.SUBTRACT)

    # F9_2_s5 → F9_2_t6 (revolve, cut)
    with BuildSketch(Plane(origin=(2.8437713092, 0.2704860048, 0), x_dir=(0, 0, 1), z_dir=(0.995507008, 0.094687893, 0))):
        Polygon((-0.79375, -58.7165017082), (0, -63.7965017082), (-0.79375, -63.7965017082), align=None)
    revolve(axis=Axis((0.4535714286, 25.4, -0.79375), (0, 0, 1)), revolution_arc=F9_2_T6_ANGLE, mode=Mode.SUBTRACT)


with BuildPart() as f7:
    # F5 (on Top) → F7 (new body, two sides)
    with BuildSketch(Plane.XY) as f7_sk:
        with Locations((-33.3375, 20.6375)):
            Circle(F5_R)
    extrude(amount=F7_DEPTH)
    extrude(f7_sk.sketch, amount=-F7_DEPTH_BACK)


with BuildPart() as f7b:
    # F5 (on Top) → F7, piece 2 (new body, two sides)
    with BuildSketch(Plane.XY) as f7_2_sk:
        with Locations((-26.9875, 20.6375)):
            Circle(F5_R)
    extrude(amount=F7_DEPTH)
    extrude(f7_2_sk.sketch, amount=-F7_DEPTH_BACK)


with BuildPart() as f7c:
    # F5 (on Top) → F7, piece 3 (new body, two sides)
    with BuildSketch(Plane.XY) as f7_3_sk:
        with Locations((26.9875, 20.6375)):
            Circle(F5_R)
    extrude(amount=F7_DEPTH)
    extrude(f7_3_sk.sketch, amount=-F7_DEPTH_BACK)


with BuildPart() as f7d:
    # F5 (on Top) → F7, piece 4 (new body, two sides)
    with BuildSketch(Plane.XY) as f7_4_sk:
        with Locations((33.3375, 20.6375)):
            Circle(F5_R)
    extrude(amount=F7_DEPTH)
    extrude(f7_4_sk.sketch, amount=-F7_DEPTH_BACK)


solid = Compound([f1_1.part, f4_1.part, f4b_1.part, f7.part, f7b.part, f7c.part, f7d.part])
